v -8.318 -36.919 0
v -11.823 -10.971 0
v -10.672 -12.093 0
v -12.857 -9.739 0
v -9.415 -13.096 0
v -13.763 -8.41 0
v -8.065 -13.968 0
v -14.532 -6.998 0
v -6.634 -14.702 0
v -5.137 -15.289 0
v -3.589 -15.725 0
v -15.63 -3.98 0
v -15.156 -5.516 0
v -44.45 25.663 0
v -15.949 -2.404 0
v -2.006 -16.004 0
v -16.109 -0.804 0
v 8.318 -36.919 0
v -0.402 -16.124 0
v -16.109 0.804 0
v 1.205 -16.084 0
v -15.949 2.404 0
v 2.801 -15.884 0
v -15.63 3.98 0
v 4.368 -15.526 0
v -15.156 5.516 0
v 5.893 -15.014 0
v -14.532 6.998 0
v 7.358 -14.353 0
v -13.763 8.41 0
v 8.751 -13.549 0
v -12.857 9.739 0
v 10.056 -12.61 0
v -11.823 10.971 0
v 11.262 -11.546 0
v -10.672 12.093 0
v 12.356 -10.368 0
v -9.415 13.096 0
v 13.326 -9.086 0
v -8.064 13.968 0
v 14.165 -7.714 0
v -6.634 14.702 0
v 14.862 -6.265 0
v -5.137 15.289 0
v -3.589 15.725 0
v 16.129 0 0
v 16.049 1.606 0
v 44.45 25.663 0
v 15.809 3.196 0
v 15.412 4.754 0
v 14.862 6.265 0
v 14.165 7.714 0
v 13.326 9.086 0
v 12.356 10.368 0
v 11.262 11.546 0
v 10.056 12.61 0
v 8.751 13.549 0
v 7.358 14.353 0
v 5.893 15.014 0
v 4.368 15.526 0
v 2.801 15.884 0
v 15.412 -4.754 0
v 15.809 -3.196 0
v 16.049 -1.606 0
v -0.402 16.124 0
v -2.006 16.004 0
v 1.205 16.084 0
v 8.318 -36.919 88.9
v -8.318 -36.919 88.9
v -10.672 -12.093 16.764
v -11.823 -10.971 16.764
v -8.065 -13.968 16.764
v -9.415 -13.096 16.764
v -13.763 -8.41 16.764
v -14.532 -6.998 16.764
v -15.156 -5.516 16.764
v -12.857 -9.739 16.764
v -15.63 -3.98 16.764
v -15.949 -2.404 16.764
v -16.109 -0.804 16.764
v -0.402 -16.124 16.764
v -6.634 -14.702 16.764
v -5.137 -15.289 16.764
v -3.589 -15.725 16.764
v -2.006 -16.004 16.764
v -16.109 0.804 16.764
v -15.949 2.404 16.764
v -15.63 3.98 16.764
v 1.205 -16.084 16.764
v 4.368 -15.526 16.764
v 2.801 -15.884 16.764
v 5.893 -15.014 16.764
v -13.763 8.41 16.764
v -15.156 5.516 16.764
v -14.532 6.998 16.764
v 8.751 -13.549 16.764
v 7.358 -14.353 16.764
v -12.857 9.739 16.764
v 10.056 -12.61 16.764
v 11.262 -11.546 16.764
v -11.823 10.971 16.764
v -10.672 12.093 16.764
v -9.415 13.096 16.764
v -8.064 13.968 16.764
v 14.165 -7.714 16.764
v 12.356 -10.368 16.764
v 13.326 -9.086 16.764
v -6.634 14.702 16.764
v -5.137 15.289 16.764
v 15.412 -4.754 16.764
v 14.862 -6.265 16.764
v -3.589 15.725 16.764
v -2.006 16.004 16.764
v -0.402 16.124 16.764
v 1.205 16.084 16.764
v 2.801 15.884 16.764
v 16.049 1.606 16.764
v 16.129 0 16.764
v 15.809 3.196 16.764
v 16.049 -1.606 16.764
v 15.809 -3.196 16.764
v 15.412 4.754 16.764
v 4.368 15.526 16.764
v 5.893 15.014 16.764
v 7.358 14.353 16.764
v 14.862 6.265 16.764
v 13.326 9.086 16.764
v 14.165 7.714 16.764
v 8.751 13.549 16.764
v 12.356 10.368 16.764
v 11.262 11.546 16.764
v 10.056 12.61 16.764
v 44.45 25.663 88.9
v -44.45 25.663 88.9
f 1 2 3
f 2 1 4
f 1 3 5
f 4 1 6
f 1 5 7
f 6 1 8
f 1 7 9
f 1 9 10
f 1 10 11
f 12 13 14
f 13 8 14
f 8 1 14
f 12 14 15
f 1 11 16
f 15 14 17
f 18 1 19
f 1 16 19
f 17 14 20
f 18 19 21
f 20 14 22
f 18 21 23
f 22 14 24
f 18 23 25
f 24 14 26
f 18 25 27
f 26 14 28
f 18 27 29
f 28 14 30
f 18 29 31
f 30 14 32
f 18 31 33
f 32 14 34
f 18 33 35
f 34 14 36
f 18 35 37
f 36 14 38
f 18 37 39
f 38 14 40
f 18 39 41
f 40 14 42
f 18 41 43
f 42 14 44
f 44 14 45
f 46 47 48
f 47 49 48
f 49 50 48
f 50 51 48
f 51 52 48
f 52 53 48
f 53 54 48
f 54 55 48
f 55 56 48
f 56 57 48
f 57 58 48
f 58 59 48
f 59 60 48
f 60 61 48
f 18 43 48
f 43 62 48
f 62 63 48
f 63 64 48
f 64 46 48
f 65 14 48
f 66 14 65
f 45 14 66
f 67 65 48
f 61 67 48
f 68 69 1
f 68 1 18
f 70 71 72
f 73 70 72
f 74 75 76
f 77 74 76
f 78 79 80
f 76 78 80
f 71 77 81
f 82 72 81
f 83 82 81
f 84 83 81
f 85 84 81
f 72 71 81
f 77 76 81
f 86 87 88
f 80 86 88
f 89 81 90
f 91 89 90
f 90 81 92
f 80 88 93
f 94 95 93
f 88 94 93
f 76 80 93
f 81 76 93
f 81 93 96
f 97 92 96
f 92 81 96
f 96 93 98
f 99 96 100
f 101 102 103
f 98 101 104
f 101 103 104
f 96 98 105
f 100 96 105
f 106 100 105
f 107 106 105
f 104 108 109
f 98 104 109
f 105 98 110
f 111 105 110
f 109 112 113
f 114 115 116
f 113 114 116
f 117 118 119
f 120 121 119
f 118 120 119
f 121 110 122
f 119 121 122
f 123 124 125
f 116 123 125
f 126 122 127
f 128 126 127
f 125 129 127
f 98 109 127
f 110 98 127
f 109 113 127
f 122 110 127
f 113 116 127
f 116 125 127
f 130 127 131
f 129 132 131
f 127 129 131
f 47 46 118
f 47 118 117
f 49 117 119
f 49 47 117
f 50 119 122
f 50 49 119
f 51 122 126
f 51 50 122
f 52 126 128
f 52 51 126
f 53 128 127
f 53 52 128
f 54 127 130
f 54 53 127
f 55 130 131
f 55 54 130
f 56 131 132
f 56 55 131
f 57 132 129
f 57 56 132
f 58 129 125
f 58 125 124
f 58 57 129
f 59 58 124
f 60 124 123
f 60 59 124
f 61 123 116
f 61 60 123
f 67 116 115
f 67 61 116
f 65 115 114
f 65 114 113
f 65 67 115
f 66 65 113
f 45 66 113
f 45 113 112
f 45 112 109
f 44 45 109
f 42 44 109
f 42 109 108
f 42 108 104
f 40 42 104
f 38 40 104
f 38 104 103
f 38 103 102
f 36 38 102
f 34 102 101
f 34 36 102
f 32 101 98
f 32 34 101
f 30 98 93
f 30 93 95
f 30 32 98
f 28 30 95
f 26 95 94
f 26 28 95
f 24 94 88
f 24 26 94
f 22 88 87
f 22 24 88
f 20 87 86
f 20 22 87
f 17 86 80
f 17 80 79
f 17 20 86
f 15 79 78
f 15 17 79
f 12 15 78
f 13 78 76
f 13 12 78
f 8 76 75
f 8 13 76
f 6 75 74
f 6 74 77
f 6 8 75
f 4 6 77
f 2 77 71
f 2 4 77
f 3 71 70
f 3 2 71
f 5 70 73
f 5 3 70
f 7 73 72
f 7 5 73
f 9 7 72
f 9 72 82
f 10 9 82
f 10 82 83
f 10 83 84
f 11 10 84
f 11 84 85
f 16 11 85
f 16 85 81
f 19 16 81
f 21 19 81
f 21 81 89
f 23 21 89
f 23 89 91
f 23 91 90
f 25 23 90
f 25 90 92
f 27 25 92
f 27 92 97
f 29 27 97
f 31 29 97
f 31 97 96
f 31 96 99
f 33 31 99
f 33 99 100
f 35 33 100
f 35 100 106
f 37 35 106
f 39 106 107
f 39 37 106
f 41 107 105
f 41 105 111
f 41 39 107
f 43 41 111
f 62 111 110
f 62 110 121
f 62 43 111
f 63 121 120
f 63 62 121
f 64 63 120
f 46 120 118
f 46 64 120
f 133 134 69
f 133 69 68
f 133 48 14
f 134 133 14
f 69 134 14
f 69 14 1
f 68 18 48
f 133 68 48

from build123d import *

# Parameters (mm, degrees)
F1_DEPTH = 88.9
F2_W     = 89.568419
F2_H     = 63.5
F3_DEPTH = 215.9
F4_R     = 16.129
F5_DEPTH = 16.764


with BuildPart() as f1:
    # F0 (on Top) → F1 (new body)
    with BuildSketch(Plane.XY):
        Polygon((44.45, 25.663219), (-44.45, 25.663219), (0, -51.326439), align=None)
    extrude(amount=F1_DEPTH)

    # F2 (on Top) → F3 (intersect)
    with BuildSketch(Plane.XY):
        with Locations((-0.249351, -5.168639)):
            Rectangle(F2_W, F2_H)
    extrude(amount=F3_DEPTH, mode=Mode.INTERSECT)

    # F4 (on Top) → F5 (cut)
    with BuildSketch(Plane.XY):
        Circle(F4_R)
    extrude(amount=F5_DEPTH, mode=Mode.SUBTRACT)


solid = f1.part
